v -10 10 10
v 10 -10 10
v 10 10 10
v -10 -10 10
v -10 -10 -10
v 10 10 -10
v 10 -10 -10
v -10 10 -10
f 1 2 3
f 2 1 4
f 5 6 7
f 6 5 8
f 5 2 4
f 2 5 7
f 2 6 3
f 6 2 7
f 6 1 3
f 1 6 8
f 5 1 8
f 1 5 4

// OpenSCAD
// Parameters
block_size = 20;
pyramid_height = 10;

// Main block with pyramids
module block_with_pyramids() {
    // Central block
    cube([block_size, block_size, block_size], center=true);
    
    // Pyramids
    pyramid([0, 0, block_size/2 + pyramid_height], "z");
    pyramid([block_size/2 + pyramid_height, 0, 0], "x");
    pyramid([-block_size/2 - pyramid_height, 0, 0], "x");
    pyramid([0, block_size/2 + pyramid_height, 0], "y");
    pyramid([0, -block_size/2 - pyramid_height, 0], "y");
    pyramid([0, 0, -block_size/2 - pyramid_height], "z");
}

module pyramid(position, axis) {
    translate(position)
    rotate_pyramid(axis)
    {
        // Create a pyramid with a square base
        polyhedron(
            points=[
                [block_size/2, block_size/2, 0],
                [-block_size/2, block_size/2, 0],
                [-block_size/2, -block_size/2, 0],
                [block_size/2, -block_size/2, 0],
                [0, 0, pyramid_height]
            ],
            faces=[
                [0, 1, 4],
                [1, 2, 4],
                [2, 3, 4],
                [3, 0, 4],
                [0, 1, 2, 3]
            ]
        );
    }
}

// Function to rotate the pyramid based on the given axis
module rotate_pyramid(axis) {
    if (axis == "x") {
        rotate([0, 90, 0]);
    } else if (axis == "y") {
        rotate([90, 0, 0]);
    } else if (axis == "z") {
        // No rotation needed for the z-axis
    }
}

block_with_pyramids();
